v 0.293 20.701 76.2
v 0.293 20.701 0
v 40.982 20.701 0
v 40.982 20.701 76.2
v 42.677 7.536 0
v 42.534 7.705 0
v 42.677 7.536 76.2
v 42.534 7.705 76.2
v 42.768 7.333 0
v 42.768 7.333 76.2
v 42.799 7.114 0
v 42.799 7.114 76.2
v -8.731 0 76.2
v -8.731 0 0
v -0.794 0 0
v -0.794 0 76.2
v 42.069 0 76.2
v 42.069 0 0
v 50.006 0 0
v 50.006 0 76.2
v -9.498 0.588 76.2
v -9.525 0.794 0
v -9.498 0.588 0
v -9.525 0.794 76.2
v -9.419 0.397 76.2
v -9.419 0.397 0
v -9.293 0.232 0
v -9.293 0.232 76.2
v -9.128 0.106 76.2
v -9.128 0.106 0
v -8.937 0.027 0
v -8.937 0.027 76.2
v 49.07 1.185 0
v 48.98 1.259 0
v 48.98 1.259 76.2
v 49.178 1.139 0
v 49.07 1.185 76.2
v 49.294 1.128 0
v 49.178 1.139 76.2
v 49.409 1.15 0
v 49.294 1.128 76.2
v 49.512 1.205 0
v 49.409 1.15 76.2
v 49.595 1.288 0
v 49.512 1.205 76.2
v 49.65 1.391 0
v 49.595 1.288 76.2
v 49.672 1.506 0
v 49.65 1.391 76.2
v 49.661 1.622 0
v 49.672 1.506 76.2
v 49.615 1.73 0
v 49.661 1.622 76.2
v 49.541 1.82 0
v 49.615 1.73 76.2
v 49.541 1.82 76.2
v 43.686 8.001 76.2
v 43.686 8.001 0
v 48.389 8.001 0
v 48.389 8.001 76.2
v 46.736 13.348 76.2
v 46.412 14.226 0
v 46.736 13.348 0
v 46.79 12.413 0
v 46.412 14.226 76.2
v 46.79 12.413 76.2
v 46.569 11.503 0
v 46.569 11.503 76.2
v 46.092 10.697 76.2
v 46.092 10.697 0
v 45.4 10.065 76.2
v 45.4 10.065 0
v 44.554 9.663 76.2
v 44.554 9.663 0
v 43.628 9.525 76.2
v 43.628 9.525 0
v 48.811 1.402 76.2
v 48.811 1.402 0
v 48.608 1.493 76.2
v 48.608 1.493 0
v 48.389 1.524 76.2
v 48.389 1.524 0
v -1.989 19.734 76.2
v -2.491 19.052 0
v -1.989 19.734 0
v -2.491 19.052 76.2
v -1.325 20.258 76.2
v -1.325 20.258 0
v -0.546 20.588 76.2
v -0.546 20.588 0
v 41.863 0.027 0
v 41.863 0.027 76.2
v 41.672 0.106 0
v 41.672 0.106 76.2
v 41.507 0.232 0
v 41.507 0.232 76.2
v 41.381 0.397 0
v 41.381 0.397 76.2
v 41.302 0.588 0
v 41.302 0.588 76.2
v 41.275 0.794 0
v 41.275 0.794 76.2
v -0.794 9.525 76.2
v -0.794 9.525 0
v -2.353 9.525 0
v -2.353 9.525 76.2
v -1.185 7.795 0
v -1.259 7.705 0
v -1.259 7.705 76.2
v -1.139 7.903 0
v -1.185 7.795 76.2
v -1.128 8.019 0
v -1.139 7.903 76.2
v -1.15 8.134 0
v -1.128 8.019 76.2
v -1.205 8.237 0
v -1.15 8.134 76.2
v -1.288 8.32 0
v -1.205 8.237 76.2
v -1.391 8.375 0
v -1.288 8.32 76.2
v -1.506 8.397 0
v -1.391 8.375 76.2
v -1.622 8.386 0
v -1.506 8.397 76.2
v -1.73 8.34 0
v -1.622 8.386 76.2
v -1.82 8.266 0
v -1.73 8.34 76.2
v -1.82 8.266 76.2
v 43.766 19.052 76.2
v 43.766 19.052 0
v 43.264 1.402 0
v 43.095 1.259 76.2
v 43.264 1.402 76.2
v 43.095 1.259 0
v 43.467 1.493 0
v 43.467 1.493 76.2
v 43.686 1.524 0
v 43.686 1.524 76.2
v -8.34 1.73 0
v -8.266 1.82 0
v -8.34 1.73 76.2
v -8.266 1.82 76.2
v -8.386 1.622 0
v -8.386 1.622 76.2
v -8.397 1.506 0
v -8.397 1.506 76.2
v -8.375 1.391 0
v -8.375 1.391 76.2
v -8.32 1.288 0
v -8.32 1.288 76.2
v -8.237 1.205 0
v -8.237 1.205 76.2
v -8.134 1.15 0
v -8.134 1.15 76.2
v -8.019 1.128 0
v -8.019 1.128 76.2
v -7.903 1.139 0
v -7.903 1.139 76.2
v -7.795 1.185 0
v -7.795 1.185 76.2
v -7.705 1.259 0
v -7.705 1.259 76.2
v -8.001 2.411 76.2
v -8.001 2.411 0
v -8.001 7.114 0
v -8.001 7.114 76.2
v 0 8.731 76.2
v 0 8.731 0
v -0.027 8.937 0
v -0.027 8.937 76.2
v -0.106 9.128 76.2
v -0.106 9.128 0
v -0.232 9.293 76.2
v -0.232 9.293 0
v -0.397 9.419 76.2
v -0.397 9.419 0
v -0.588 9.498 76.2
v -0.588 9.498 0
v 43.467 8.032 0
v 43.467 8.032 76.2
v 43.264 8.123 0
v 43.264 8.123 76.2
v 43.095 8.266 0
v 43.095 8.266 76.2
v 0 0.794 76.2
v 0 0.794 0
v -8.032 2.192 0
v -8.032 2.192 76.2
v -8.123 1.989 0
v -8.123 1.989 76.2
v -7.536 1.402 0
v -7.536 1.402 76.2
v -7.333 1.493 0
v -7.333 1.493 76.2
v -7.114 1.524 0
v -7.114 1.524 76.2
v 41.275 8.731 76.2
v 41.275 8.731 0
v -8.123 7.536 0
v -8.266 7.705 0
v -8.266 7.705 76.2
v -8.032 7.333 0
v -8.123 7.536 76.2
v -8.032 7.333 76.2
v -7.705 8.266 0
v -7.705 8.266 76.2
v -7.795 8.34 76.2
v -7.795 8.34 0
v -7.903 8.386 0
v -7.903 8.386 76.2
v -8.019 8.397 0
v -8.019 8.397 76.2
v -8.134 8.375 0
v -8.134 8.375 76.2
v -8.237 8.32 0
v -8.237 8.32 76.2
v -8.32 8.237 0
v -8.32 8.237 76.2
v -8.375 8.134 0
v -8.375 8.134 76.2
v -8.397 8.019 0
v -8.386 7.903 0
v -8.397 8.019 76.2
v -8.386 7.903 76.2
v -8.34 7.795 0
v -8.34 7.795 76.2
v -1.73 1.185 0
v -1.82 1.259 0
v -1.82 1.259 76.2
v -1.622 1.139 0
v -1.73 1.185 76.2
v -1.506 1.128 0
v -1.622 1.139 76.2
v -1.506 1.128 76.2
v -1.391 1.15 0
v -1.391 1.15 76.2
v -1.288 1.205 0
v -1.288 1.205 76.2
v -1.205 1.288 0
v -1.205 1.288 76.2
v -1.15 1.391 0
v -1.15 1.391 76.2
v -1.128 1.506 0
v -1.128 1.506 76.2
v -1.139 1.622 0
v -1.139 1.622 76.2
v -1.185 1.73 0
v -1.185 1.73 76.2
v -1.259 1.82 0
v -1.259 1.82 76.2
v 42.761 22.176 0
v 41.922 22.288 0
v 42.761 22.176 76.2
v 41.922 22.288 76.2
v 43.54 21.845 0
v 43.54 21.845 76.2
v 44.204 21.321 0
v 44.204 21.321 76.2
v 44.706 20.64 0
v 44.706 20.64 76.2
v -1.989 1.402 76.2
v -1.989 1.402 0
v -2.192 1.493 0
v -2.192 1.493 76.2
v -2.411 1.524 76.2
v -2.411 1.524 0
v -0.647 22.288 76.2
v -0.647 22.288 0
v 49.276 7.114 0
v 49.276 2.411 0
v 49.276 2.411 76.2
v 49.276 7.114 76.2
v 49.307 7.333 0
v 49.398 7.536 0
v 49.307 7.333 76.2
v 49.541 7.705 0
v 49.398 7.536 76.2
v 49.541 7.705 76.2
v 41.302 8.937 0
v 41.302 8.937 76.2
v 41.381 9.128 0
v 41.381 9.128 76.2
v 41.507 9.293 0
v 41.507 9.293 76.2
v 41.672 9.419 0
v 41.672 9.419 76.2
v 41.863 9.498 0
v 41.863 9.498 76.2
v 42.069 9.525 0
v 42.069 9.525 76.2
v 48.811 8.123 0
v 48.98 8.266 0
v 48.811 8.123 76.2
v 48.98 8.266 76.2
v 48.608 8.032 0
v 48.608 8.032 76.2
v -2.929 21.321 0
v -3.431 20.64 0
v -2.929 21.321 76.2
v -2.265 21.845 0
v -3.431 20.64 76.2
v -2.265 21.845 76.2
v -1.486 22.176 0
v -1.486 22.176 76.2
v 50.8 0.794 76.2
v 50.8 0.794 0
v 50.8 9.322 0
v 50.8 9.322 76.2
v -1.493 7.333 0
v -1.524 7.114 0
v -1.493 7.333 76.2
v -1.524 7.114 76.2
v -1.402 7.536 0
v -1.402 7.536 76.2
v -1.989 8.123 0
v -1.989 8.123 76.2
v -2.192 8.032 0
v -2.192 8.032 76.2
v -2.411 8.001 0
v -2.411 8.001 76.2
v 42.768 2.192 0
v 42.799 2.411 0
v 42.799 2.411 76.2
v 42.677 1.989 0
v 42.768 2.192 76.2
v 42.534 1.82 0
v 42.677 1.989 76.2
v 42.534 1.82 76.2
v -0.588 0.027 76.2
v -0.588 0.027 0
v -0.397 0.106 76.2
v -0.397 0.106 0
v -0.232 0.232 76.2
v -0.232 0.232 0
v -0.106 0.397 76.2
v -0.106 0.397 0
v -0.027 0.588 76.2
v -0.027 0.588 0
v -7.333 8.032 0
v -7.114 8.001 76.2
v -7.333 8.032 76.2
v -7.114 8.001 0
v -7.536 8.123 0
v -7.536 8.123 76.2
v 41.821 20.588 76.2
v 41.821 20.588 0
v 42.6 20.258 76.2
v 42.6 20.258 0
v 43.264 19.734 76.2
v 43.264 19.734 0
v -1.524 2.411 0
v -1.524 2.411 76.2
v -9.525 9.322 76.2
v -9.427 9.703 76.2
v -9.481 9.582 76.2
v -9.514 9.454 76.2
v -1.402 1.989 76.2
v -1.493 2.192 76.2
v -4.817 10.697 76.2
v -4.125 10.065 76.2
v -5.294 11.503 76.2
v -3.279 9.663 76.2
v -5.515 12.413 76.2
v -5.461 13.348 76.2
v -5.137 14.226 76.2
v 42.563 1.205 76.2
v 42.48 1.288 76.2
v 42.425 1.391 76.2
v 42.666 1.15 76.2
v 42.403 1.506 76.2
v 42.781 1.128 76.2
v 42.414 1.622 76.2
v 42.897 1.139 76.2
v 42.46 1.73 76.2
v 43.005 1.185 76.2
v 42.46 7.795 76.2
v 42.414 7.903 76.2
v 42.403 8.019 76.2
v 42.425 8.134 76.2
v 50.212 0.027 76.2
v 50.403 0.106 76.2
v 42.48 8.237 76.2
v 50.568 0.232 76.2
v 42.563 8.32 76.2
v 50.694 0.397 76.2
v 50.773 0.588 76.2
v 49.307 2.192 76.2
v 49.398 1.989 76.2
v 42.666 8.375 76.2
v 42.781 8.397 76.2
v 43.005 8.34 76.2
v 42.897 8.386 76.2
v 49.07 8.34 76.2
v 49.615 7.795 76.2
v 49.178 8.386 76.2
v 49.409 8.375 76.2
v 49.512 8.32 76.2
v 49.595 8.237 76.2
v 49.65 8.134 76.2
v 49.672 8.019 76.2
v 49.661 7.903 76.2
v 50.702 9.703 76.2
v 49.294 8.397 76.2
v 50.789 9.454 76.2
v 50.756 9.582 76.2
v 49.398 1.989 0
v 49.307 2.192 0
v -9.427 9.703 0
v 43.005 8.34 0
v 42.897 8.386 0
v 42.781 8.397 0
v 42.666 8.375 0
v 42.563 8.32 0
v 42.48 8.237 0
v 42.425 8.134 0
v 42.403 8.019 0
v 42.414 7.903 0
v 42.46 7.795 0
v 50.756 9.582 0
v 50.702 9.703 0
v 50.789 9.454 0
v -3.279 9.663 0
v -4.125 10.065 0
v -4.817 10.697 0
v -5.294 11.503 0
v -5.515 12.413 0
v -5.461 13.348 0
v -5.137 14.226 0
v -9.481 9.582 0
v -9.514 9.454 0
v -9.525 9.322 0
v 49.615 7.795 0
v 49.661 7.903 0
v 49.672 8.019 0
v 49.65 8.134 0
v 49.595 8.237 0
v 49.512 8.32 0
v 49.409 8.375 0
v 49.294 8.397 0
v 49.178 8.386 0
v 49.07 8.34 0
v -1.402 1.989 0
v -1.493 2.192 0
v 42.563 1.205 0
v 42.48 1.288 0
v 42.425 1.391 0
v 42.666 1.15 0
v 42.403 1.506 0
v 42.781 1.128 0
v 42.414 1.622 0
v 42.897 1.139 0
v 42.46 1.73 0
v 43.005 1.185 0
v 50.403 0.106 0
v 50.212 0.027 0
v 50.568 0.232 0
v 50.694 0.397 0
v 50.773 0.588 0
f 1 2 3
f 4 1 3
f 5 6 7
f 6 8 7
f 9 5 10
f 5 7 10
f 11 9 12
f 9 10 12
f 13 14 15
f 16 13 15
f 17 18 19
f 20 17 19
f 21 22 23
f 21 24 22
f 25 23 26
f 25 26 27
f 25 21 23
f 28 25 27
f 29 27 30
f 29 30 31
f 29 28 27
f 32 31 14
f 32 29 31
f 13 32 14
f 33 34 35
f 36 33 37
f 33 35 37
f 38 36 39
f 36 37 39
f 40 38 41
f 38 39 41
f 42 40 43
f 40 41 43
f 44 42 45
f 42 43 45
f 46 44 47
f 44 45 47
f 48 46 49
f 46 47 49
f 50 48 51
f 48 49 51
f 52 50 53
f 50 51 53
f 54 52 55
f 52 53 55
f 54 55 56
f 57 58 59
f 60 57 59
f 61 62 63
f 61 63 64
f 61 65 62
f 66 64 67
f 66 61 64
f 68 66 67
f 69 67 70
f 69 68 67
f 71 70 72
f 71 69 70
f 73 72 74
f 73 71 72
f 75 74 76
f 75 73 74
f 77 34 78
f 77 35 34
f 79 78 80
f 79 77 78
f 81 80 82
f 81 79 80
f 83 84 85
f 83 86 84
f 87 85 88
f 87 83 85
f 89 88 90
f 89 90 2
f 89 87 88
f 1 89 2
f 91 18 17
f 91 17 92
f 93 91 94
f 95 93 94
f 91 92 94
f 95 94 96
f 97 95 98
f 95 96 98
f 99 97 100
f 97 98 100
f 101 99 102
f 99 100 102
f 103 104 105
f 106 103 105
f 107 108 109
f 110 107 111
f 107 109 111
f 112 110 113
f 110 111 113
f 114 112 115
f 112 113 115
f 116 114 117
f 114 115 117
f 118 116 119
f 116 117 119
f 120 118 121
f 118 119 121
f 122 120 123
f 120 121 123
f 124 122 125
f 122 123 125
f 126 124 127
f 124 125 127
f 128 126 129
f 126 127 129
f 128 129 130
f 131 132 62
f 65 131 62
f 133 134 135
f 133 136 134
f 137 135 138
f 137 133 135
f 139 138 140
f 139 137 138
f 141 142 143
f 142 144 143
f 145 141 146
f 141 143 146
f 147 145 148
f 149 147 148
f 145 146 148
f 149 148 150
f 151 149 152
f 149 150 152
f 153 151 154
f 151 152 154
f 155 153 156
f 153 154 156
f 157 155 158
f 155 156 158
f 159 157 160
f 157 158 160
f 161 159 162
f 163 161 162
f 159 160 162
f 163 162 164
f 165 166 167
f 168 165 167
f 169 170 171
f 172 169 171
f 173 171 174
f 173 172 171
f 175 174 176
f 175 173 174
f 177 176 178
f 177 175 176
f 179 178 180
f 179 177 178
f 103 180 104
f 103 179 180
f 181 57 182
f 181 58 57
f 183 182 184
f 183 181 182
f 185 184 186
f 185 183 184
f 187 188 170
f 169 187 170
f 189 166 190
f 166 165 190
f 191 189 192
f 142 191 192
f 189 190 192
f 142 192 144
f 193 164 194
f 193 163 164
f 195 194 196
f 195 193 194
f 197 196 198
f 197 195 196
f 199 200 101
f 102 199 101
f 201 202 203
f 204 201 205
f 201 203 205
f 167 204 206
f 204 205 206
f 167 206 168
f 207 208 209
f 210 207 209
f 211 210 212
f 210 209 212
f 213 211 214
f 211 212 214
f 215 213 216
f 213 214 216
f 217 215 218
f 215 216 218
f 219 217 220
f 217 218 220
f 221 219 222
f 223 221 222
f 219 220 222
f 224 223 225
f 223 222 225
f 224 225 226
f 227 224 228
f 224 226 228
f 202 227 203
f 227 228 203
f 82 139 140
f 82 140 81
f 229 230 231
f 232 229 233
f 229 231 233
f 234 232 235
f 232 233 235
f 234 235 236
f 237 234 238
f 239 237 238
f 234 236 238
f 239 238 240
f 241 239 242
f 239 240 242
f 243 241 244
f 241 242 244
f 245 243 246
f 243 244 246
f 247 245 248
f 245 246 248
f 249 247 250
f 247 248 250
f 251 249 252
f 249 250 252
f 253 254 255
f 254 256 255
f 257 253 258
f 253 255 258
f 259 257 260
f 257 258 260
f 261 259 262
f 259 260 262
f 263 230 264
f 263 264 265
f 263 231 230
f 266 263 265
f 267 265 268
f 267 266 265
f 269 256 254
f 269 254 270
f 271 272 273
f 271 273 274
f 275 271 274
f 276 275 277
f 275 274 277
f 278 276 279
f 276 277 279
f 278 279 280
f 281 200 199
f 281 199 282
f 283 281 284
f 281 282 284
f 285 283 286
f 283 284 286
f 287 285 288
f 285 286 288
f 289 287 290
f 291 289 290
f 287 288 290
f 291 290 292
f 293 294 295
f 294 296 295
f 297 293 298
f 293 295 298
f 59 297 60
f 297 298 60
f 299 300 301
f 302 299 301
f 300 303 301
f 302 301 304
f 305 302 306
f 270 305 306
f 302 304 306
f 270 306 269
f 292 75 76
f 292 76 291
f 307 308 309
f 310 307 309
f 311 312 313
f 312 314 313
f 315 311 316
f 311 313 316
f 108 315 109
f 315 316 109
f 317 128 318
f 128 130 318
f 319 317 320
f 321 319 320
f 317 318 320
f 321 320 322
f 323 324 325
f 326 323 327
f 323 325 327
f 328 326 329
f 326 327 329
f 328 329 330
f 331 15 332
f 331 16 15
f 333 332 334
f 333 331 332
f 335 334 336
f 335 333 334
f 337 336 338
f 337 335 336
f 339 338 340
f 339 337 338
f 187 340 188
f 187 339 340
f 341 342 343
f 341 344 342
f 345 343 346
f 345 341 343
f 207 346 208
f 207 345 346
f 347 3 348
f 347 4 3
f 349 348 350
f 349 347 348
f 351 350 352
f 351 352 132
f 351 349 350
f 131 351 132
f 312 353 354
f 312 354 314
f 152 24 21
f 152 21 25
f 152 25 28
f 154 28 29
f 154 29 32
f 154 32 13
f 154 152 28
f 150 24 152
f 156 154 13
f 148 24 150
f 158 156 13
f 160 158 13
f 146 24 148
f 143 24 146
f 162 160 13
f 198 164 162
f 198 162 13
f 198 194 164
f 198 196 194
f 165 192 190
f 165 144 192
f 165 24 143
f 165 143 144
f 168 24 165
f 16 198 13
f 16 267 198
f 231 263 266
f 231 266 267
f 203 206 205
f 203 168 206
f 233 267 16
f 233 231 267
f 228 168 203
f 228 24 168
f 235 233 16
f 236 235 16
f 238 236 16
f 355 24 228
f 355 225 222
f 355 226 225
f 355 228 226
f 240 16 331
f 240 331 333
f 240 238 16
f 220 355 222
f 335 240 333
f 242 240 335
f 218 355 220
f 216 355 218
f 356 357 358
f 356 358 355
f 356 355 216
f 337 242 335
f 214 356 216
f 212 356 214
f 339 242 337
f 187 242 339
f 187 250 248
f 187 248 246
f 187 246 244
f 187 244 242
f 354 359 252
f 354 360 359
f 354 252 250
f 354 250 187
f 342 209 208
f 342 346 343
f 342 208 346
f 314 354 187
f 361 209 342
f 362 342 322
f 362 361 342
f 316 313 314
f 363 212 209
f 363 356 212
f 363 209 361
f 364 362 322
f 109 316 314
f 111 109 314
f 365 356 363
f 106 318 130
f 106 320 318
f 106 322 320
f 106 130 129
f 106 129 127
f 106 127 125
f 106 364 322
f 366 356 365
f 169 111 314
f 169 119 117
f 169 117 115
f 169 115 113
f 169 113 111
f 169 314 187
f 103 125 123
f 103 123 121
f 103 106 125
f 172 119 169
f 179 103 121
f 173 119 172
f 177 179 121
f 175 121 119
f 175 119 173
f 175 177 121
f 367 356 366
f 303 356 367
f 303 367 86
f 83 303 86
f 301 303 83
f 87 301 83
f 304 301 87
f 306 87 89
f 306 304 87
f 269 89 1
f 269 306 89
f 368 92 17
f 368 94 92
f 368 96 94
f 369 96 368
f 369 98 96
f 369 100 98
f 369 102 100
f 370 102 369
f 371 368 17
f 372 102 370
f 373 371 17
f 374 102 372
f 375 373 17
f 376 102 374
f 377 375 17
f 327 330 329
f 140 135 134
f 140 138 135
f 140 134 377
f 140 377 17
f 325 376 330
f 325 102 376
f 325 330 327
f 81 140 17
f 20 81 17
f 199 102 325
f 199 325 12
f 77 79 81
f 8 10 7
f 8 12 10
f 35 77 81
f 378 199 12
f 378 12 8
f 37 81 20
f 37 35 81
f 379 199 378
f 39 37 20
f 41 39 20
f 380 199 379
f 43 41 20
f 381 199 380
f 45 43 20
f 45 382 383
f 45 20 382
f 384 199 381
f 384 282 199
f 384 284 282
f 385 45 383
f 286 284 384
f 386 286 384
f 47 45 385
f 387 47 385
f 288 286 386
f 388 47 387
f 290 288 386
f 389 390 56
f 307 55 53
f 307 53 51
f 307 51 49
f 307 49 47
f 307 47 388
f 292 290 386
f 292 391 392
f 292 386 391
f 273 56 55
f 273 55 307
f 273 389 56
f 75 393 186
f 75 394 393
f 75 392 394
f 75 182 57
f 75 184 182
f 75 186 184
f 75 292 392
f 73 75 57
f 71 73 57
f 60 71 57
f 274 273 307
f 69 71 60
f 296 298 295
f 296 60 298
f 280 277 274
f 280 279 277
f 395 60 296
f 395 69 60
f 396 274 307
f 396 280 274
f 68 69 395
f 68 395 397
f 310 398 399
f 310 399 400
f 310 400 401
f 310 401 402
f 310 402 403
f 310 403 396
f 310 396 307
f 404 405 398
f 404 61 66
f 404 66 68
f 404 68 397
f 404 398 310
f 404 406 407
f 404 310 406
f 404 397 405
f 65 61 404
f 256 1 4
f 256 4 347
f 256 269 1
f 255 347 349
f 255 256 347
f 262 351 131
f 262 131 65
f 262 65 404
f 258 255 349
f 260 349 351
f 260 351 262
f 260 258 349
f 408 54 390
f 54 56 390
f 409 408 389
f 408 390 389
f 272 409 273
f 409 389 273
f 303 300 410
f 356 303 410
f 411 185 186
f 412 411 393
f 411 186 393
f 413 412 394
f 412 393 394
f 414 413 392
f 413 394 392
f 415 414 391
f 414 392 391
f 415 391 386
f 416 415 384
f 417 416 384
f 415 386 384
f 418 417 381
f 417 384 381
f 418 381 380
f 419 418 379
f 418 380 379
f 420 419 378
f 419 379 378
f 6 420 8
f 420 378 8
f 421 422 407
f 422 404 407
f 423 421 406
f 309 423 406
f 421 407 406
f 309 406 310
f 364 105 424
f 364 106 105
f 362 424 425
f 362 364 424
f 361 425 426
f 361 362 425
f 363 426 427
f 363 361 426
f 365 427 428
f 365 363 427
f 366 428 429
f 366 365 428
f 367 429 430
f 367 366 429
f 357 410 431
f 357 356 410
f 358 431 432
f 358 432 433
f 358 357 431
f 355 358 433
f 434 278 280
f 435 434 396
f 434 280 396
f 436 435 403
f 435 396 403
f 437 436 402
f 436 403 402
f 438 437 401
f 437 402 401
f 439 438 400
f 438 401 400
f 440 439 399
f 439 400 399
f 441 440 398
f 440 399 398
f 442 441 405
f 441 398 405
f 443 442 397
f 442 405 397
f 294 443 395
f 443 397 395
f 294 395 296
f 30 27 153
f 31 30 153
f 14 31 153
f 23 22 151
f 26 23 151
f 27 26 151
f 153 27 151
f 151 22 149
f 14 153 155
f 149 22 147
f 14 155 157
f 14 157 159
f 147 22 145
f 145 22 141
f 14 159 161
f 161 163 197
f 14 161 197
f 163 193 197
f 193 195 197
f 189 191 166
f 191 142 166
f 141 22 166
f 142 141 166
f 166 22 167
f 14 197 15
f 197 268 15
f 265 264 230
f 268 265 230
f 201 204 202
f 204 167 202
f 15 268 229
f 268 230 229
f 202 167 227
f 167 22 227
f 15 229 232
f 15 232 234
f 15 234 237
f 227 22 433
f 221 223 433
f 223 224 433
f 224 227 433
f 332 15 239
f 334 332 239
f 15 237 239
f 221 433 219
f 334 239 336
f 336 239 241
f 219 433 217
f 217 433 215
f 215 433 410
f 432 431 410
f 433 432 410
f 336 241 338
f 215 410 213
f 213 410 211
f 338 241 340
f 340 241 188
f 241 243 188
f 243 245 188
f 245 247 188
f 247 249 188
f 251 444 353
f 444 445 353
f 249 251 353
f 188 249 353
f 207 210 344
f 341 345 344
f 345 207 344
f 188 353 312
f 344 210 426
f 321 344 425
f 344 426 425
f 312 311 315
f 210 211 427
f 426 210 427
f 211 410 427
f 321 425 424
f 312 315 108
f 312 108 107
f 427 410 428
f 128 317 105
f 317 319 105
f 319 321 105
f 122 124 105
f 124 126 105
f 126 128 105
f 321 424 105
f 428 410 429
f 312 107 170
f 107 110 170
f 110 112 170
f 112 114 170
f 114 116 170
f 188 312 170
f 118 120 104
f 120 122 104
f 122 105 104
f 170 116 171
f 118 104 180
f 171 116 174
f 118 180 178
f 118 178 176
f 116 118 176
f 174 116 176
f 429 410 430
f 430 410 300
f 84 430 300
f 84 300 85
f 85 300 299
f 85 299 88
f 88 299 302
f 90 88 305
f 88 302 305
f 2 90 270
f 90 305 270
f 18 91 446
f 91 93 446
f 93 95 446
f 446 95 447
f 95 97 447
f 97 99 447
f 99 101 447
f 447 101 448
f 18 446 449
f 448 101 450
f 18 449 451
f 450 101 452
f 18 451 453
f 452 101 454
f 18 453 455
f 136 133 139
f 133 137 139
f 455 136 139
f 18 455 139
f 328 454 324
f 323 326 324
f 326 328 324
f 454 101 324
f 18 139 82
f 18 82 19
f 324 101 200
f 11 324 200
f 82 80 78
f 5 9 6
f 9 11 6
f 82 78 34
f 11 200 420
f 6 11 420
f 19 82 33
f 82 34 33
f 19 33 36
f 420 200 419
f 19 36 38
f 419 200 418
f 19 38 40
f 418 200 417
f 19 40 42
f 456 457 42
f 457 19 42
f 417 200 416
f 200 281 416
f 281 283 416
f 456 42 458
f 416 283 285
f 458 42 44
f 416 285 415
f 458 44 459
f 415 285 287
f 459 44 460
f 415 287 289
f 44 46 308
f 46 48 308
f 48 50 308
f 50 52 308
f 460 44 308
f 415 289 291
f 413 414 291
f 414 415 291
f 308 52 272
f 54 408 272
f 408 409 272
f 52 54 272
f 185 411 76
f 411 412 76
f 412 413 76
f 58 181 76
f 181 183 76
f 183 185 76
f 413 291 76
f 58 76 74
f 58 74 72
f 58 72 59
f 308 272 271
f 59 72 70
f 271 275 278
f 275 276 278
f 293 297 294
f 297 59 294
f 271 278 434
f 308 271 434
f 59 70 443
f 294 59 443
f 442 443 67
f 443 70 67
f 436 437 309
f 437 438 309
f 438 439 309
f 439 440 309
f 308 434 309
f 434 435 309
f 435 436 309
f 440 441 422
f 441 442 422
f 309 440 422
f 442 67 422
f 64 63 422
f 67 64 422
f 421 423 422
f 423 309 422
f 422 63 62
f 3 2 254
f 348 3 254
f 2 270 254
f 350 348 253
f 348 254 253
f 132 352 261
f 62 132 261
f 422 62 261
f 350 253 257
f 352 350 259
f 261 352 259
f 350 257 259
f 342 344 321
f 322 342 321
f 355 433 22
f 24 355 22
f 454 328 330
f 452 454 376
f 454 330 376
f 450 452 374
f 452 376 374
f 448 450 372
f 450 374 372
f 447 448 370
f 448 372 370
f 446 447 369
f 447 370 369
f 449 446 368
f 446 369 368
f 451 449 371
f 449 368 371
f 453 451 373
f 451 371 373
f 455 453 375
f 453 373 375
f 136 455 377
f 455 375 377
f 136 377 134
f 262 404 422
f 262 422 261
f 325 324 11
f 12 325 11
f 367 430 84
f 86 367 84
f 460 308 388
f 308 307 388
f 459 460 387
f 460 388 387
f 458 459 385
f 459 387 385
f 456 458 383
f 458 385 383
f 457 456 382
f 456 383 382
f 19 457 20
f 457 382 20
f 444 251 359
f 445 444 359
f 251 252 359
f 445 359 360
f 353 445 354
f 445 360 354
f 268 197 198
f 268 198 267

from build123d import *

# Parameters (mm, degrees)
SKETCH1_W           = 6.477
SKETCH1_H           = 6.477
BOSS_EXTRUDE1_DEPTH = 76.2
FILLET1_R           = 3.175
FILLET2_R           = 0.79375
SKETCH2_R           = 0.396875
CUT_EXTRUDE1_DEPTH  = 95.254215992
FILLET3_R           = 0.79375


with BuildPart() as part:
    # Sketch1 → Boss-Extrude1 (new body)
    with BuildSketch(Plane.XY):
        Polygon((-9.525, 0), (0, 0), (0, 9.525), (-7.714580181, 9.525), (-1.5875, 20.701), (42.8625, 20.701), (48.989580181, 9.525), (41.275, 9.525), (41.275, 0), (50.8, 0), (50.8, 9.525), (43.80259593, 22.2885), (-2.52759593, 22.2885), (-9.525, 9.525), align=None)
        with Locations((-4.7625, 4.7625)):
            Rectangle(SKETCH1_W, SKETCH1_H, mode=Mode.SUBTRACT)
        with Locations((46.0375, 4.7625)):
            Rectangle(SKETCH1_W, SKETCH1_H, mode=Mode.SUBTRACT)
    extrude(amount=BOSS_EXTRUDE1_DEPTH)

    # Fillet1
    fillet1_edges = [part.edges().sort_by_distance(p)[0] for p in [
        (-2.52759593, 22.2885, 38.1),
        (43.80259593, 22.2885, 38.1),
        (48.989580181, 9.525, 38.1),
        (42.8625, 20.701, 38.1),
        (-1.5875, 20.701, 38.1),
        (-7.714580181, 9.525, 38.1),
    ]]
    fillet(fillet1_edges, radius=FILLET1_R)

    # Fillet2
    fillet2_edges = [part.edges().sort_by_distance(p)[0] for p in [
        (0, 0, 38.1),
        (-9.525, 0, 38.1),
        (-9.525, 9.525, 38.1),
        (50.8, 9.525, 38.1),
        (50.8, 0, 38.1),
        (41.275, 0, 38.1),
        (41.275, 9.525, 38.1),
        (0, 9.525, 38.1),
    ]]
    fillet(fillet2_edges, radius=FILLET2_R)

    # Sketch2 → Cut-Extrude1 (cut, through all)
    with BuildSketch(Plane.XY.offset(76.2)):
        with Locations((-8.001, 8.001)):
            Circle(SKETCH2_R)
        with Locations((-1.524, 8.001)):
            Circle(SKETCH2_R)
        with Locations((-1.524, 1.524)):
            Circle(SKETCH2_R)
        with Locations((-8.001, 1.524)):
            Circle(SKETCH2_R)
        with Locations((42.799, 8.001)):
            Circle(SKETCH2_R)
        with Locations((42.799, 1.524)):
            Circle(SKETCH2_R)
        with Locations((49.276, 1.524)):
            Circle(SKETCH2_R)
        with Locations((49.276, 8.001)):
            Circle(SKETCH2_R)
    extrude(amount=-CUT_EXTRUDE1_DEPTH, mode=Mode.SUBTRACT)

    # Fillet3
    fillet3_edges = [part.edges().sort_by_distance(p)[0] for p in [
        (48.879125, 8.001, 38.1),
        (43.195875, 8.001, 38.1),
        (49.276, 1.920875, 38.1),
        (43.195875, 1.524, 38.1),
        (-1.920875, 1.524, 38.1),
        (-7.604125, 1.524, 38.1),
        (-8.001, 7.604125, 38.1),
        (-1.920875, 8.001, 38.1),
        (42.799, 7.604125, 38.1),
        (-8.001, 1.920875, 38.1),
        (-1.524, 1.920875, 38.1),
        (-1.524, 7.604125, 38.1),
        (42.799, 1.920875, 38.1),
        (48.879125, 1.524, 38.1),
        (49.276, 7.604125, 38.1),
        (-7.604125, 8.001, 38.1),
    ]]
    fillet(fillet3_edges, radius=FILLET3_R)


solid = part.part
